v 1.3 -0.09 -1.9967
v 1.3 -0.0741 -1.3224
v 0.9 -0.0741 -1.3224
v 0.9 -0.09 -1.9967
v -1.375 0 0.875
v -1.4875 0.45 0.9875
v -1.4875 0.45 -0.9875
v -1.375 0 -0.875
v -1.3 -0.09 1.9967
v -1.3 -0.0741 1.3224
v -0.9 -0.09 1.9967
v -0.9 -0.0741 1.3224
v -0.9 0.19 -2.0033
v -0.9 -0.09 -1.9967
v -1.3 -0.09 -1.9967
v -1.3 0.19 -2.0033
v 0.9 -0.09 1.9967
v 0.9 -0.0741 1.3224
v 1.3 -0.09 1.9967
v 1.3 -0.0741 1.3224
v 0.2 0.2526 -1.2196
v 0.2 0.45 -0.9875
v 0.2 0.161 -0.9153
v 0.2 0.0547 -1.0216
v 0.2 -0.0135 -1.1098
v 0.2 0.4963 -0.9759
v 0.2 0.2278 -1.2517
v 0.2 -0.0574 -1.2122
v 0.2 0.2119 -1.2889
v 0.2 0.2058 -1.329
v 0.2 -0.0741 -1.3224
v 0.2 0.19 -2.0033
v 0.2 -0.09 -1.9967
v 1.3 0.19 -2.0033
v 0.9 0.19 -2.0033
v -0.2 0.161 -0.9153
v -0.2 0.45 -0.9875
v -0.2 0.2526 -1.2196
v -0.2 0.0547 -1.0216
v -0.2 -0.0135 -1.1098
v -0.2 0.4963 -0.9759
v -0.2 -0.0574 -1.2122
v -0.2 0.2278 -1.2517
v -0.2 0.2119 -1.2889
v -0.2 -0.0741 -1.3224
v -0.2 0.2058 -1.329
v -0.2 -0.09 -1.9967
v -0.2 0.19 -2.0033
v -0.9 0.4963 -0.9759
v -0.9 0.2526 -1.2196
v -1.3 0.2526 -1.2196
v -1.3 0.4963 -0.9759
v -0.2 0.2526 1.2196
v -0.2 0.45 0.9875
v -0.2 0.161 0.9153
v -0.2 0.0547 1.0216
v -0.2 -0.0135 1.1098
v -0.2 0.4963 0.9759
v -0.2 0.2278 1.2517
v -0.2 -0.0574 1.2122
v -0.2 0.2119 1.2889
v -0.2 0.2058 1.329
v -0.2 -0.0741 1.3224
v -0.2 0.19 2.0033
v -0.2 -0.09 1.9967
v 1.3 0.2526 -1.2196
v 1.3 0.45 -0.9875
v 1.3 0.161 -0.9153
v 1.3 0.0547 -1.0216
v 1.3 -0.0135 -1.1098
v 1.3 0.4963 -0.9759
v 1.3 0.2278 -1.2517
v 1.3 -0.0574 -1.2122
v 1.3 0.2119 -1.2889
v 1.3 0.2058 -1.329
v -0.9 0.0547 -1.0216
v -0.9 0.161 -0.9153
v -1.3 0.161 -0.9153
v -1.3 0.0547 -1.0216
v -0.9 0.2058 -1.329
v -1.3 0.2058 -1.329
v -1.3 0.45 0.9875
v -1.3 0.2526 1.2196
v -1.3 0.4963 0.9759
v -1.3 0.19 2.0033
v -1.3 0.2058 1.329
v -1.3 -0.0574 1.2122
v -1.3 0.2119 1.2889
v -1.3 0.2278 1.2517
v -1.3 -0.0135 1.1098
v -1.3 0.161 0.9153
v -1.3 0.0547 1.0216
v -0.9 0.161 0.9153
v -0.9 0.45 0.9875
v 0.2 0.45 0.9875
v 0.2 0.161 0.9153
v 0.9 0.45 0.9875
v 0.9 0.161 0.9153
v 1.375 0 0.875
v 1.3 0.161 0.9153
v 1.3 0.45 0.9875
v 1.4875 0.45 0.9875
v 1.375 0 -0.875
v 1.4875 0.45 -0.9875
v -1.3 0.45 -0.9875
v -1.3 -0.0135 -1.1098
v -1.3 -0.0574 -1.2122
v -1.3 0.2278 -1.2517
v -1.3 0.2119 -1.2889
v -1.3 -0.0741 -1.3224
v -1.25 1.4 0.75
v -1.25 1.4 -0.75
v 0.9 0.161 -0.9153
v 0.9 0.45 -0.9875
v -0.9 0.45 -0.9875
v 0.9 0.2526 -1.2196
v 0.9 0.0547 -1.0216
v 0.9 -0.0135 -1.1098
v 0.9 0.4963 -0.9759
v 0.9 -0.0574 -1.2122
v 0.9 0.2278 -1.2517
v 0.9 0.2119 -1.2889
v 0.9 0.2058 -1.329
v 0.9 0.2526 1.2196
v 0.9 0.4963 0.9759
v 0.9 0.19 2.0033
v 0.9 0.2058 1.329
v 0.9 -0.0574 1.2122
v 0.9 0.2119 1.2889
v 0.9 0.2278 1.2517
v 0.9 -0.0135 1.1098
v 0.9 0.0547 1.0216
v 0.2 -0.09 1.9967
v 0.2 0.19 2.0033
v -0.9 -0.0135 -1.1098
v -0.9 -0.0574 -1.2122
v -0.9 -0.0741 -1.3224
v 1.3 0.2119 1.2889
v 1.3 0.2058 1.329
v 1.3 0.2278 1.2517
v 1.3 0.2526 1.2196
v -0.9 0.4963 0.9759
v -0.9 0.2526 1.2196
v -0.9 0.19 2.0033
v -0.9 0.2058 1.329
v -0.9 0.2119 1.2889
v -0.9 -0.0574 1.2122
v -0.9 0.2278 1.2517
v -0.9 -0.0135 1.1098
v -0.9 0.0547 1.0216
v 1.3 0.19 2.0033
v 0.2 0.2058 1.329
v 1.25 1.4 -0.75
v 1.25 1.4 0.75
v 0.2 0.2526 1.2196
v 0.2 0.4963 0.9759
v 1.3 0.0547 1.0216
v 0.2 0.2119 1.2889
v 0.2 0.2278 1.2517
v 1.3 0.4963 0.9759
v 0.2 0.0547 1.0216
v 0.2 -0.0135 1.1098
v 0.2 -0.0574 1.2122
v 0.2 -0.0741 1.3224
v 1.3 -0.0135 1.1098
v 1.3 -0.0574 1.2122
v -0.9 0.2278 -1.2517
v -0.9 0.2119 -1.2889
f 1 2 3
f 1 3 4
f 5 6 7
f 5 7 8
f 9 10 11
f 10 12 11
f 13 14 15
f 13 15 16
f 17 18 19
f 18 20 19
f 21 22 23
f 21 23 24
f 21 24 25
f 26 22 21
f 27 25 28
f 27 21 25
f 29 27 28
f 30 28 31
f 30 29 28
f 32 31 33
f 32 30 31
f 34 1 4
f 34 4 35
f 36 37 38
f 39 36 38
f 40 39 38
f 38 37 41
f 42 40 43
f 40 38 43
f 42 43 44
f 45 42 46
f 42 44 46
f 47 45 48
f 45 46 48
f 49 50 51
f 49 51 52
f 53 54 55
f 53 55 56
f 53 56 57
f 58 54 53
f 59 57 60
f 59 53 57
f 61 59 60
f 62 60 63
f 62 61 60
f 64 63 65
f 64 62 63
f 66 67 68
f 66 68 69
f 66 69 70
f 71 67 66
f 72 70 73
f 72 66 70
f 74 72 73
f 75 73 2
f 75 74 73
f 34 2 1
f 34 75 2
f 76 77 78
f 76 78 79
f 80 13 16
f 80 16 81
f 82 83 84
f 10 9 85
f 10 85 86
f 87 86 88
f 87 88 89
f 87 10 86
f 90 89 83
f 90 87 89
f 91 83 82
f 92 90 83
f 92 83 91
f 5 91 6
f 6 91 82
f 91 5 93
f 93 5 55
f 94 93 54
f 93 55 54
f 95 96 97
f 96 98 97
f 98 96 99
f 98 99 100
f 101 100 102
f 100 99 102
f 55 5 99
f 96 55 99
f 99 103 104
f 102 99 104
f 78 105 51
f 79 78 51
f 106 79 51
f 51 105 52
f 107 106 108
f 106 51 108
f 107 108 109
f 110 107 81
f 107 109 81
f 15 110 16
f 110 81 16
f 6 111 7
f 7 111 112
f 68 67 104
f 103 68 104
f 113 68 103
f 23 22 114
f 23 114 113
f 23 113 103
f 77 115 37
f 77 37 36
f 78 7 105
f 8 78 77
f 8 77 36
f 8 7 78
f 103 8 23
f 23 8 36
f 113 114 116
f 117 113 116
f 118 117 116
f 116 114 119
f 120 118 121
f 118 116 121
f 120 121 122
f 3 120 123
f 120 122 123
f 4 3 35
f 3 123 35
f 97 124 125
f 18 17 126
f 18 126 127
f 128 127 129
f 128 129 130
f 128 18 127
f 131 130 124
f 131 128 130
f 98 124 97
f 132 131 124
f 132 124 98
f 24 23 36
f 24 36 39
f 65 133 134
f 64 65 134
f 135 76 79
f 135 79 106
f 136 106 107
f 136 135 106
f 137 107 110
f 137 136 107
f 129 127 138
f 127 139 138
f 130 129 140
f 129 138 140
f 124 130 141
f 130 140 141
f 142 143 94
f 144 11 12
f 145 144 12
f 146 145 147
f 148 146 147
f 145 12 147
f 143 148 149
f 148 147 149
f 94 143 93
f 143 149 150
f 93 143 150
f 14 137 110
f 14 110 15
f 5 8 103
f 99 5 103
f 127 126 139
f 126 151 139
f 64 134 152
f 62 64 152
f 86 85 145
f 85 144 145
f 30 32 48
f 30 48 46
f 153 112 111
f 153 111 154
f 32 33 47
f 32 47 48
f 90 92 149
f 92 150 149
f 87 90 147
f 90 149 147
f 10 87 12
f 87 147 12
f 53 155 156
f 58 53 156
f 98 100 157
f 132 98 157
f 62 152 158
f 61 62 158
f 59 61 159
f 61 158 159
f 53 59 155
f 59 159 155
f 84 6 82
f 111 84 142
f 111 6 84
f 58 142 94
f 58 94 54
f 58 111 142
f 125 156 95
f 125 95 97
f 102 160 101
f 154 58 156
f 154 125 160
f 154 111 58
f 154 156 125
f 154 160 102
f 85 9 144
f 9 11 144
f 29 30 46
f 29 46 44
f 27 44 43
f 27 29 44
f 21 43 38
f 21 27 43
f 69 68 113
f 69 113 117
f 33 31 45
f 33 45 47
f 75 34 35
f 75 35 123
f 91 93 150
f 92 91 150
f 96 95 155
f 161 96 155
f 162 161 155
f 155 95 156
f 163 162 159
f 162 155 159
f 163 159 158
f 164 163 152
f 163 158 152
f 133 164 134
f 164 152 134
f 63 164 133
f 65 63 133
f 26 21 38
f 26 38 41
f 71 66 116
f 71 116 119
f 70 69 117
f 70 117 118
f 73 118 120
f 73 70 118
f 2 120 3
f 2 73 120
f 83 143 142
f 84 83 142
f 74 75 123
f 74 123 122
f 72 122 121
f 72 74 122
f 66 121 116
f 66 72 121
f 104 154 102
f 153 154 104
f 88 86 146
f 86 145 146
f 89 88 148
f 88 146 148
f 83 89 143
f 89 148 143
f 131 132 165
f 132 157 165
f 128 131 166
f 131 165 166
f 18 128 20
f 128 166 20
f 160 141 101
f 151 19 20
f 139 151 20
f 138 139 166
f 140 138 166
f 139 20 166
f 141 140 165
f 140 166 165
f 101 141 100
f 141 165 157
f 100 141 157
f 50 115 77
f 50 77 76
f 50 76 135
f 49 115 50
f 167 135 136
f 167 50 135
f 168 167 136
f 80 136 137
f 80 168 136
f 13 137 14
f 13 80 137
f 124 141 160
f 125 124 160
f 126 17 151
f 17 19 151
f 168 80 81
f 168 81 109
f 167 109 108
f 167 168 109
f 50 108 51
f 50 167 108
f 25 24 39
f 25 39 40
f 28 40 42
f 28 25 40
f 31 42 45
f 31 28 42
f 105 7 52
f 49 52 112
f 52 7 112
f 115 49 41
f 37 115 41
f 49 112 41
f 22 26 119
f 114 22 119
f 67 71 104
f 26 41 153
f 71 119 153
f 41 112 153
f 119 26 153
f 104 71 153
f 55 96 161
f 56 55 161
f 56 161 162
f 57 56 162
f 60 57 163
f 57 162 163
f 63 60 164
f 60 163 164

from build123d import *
from OCP.BRepFilletAPI import BRepFilletAPI_MakeChamfer

# Parameters (mm, degrees)
SKETCH1_W            = 3
SKETCH1_H            = 2
IC_DEPTH             = 1.4
IC_TC_SIZE           = 1
IC_TC_SIZE2          = 0.25
IC_BC_SIZE           = 0.125
IC_BC_SIZE_2         = 0.5
LEG_EXTRUDED_DEPTH   = 0.2
LEG_P_COUNT          = 2
LEG_P_PITCH          = 1.1
LEG_P_COL_COUNT      = 2
LEG_P_COL_PITCH      = 1.1
MIRROR1_COPY_1_DEPTH = 0.2
MIRROR1_COPY_2_DEPTH = 0.2


with BuildPart() as part:
    # Sketch1 → IC (new body)
    with BuildSketch(Plane(origin=(0, 0, 0), x_dir=(1, 0, 0), z_dir=(0, 1, 0))):
        Rectangle(SKETCH1_W, SKETCH1_H)
    extrude(amount=IC_DEPTH)

    # IC TC: one chamfer whose edges measure the first distance from different faces: ONE call of the kernel's chamfer builder (chamfer() names one face for all edges)
    ic_tc_edges_1 = [part.edges().sort_by_distance(p)[0] for p in [
        (1.5, 1.4, 0),
    ]]
    ic_tc_side_1 = [part.faces().sort_by_distance(p)[0] for p in [
        (1.5, 0.7, 0),
    ]]
    ic_tc_edges_2 = [part.edges().sort_by_distance(p)[0] for p in [
        (0, 1.4, -1),
    ]]
    ic_tc_side_2 = [part.faces().sort_by_distance(p)[0] for p in [
        (0, 0.7, -1),
    ]]
    ic_tc_edges_3 = [part.edges().sort_by_distance(p)[0] for p in [
        (-1.5, 1.4, 0),
    ]]
    ic_tc_side_3 = [part.faces().sort_by_distance(p)[0] for p in [
        (-1.5, 0.7, 0),
    ]]
    ic_tc_edges_4 = [part.edges().sort_by_distance(p)[0] for p in [
        (0, 1.4, 1),
    ]]
    ic_tc_side_4 = [part.faces().sort_by_distance(p)[0] for p in [
        (0, 0.7, 1),
    ]]
    ic_tc = BRepFilletAPI_MakeChamfer(part.part.solid().wrapped)
    for e in ic_tc_edges_1:
        ic_tc.Add(IC_TC_SIZE, IC_TC_SIZE2, e.wrapped, ic_tc_side_1[0].wrapped)  # the first distance lies on this face
    for e in ic_tc_edges_2:
        ic_tc.Add(IC_TC_SIZE, IC_TC_SIZE2, e.wrapped, ic_tc_side_2[0].wrapped)  # the first distance lies on this face
    for e in ic_tc_edges_3:
        ic_tc.Add(IC_TC_SIZE, IC_TC_SIZE2, e.wrapped, ic_tc_side_3[0].wrapped)  # the first distance lies on this face
    for e in ic_tc_edges_4:
        ic_tc.Add(IC_TC_SIZE, IC_TC_SIZE2, e.wrapped, ic_tc_side_4[0].wrapped)  # the first distance lies on this face
    add(Compound.cast(ic_tc.Shape()), mode=Mode.REPLACE)

    # IC BC
    # the kernel refuses this chamfer: 0.5, 0.125 mm, written as the material it takes off along each edge
    with BuildSketch(Plane(origin=(2.79856375, 0, 1), x_dir=(0, -0.1477835663365713, -0.9890197255468893), z_dir=(-1, 0, 0))) as ic_bc_piece_1:
        Polygon((IC_BC_SIZE * 0.989019725547, -IC_BC_SIZE * 0.147783566337), (-IC_BC_SIZE_2 * 0.147783566337, -IC_BC_SIZE_2 * 0.989019725547), (0, 0), align=None)
    extrude(amount=5.5971275, mode=Mode.SUBTRACT)
    with BuildSketch(Plane(origin=(-1.5, 0, 2.29856375), x_dir=(-0.00933861064031752, 0.9999563942249224, 0), z_dir=(0, 0, -1))) as ic_bc_piece_2:
        Polygon((IC_BC_SIZE_2 * 0.999956394225, IC_BC_SIZE_2 * 0.00933861064032), (-IC_BC_SIZE * 0.00933861064032, IC_BC_SIZE * 0.999956394225), (0, 0), align=None)
    extrude(amount=4.5971275, mode=Mode.SUBTRACT)
    with BuildSketch(Plane(origin=(-2.79856375, 0, -1), x_dir=(0, 0.9999563942249224, -0.00933861064031752), z_dir=(1, 0, 0))) as ic_bc_piece_3:
        Polygon((IC_BC_SIZE_2 * 0.999956394225, IC_BC_SIZE_2 * 0.00933861064032), (-IC_BC_SIZE * 0.00933861064032, IC_BC_SIZE * 0.999956394225), (0, 0), align=None)
    extrude(amount=5.5971275, mode=Mode.SUBTRACT)
    with BuildSketch(Plane(origin=(1.5, 0, -2.29856375), x_dir=(-0.9890197255468893, -0.1477835663365713, 0), z_dir=(0, 0, 1))) as ic_bc_piece_4:
        Polygon((IC_BC_SIZE * 0.989019725547, -IC_BC_SIZE * 0.147783566337), (-IC_BC_SIZE_2 * 0.147783566337, -IC_BC_SIZE_2 * 0.989019725547), (0, 0), align=None)
    extrude(amount=4.5971275, mode=Mode.SUBTRACT)

    # Sketch3 → LEG EXTRUDED (add, symmetric)
    with BuildSketch(Plane(origin=(0, 0, 0), x_dir=(0, 0, -1), z_dir=(1, 0, 0))):
        with BuildLine():
            Line((0, 0.41), (0.6, 0.41))
            ThreePointArc((0.6, 0.41), (0.661229349, 0.397820725), (0.713137085, 0.363137085))
            Line((0.713137085, 0.363137085), (1.021622695, 0.054651475))
            ThreePointArc((1.021622695, 0.054651475), (1.159600548, -0.038720464), (1.32240259, -0.074099863))
            Line((1.32240259, -0.074099863), (1.996707745, -0.089961284))
            Line((1.996707745, -0.089961284), (2.003292255, 0.189961284))
            Line((2.003292255, 0.189961284), (1.328987101, 0.205822705))
            ThreePointArc((1.328987101, 0.205822705), (1.269786359, 0.218687941), (1.219612594, 0.252641373))
            Line((1.219612594, 0.252641373), (0.911126984, 0.561126984))
            ThreePointArc((0.911126984, 0.561126984), (0.76838071, 0.656506994), (0.6, 0.69))
            Line((0.6, 0.69), (0, 0.69))
            Line((0, 0.69), (0, 0.41))
        make_face()
    leg_extruded = extrude(amount=LEG_EXTRUDED_DEPTH, both=True)

    # LEG P: LEG EXTRUDED ×2
    with Locations(*[(-i * LEG_P_PITCH, 0, 0) for i in range(1, LEG_P_COUNT)]):
        add(leg_extruded)

    # LEG P col: LEG EXTRUDED ×2
    with Locations(*[(i * LEG_P_COL_PITCH, 0, 0) for i in range(1, LEG_P_COL_COUNT)]):
        add(leg_extruded)

    # Mirror1: LEG EXTRUDED across plane
    add(leg_extruded.mirror(Plane.XY))

    # Mirror1 copy 1 sketch → Mirror1 copy 1 (add, symmetric)
    with BuildSketch(Plane(origin=(-1.1, 0, 0), x_dir=(0, 0, 1), z_dir=(1, 0, 0))):
        with BuildLine():
            Line((0, -0.41), (0.6, -0.41))
            ThreePointArc((0.6, -0.41), (0.661229349, -0.397820725), (0.713137085, -0.363137085))
            Line((0.713137085, -0.363137085), (1.021622695, -0.054651475))
            ThreePointArc((1.021622695, -0.054651475), (1.159600548, 0.038720464), (1.32240259, 0.074099863))
            Line((1.32240259, 0.074099863), (1.996707745, 0.089961284))
            Line((1.996707745, 0.089961284), (2.003292255, -0.189961284))
            Line((2.003292255, -0.189961284), (1.328987101, -0.205822705))
            ThreePointArc((1.328987101, -0.205822705), (1.269786359, -0.218687941), (1.219612594, -0.252641373))
            Line((1.219612594, -0.252641373), (0.911126984, -0.561126984))
            ThreePointArc((0.911126984, -0.561126984), (0.76838071, -0.656506994), (0.6, -0.69))
            Line((0.6, -0.69), (0, -0.69))
            Line((0, -0.69), (0, -0.41))
        make_face()
    extrude(amount=MIRROR1_COPY_1_DEPTH, both=True)

    # Mirror1 copy 2 sketch → Mirror1 copy 2 (add, symmetric)
    with BuildSketch(Plane(origin=(1.1, 0, 0), x_dir=(0, 0, 1), z_dir=(1, 0, 0))):
        with BuildLine():
            Line((0, -0.41), (0.6, -0.41))
            ThreePointArc((0.6, -0.41), (0.661229349, -0.397820725), (0.713137085, -0.363137085))
            Line((0.713137085, -0.363137085), (1.021622695, -0.054651475))
            ThreePointArc((1.021622695, -0.054651475), (1.159600548, 0.038720464), (1.32240259, 0.074099863))
            Line((1.32240259, 0.074099863), (1.996707745, 0.089961284))
            Line((1.996707745, 0.089961284), (2.003292255, -0.189961284))
            Line((2.003292255, -0.189961284), (1.328987101, -0.205822705))
            ThreePointArc((1.328987101, -0.205822705), (1.269786359, -0.218687941), (1.219612594, -0.252641373))
            Line((1.219612594, -0.252641373), (0.911126984, -0.561126984))
            ThreePointArc((0.911126984, -0.561126984), (0.76838071, -0.656506994), (0.6, -0.69))
            Line((0.6, -0.69), (0, -0.69))
            Line((0, -0.69), (0, -0.41))
        make_face()
    extrude(amount=MIRROR1_COPY_2_DEPTH, both=True)


solid = part.part
